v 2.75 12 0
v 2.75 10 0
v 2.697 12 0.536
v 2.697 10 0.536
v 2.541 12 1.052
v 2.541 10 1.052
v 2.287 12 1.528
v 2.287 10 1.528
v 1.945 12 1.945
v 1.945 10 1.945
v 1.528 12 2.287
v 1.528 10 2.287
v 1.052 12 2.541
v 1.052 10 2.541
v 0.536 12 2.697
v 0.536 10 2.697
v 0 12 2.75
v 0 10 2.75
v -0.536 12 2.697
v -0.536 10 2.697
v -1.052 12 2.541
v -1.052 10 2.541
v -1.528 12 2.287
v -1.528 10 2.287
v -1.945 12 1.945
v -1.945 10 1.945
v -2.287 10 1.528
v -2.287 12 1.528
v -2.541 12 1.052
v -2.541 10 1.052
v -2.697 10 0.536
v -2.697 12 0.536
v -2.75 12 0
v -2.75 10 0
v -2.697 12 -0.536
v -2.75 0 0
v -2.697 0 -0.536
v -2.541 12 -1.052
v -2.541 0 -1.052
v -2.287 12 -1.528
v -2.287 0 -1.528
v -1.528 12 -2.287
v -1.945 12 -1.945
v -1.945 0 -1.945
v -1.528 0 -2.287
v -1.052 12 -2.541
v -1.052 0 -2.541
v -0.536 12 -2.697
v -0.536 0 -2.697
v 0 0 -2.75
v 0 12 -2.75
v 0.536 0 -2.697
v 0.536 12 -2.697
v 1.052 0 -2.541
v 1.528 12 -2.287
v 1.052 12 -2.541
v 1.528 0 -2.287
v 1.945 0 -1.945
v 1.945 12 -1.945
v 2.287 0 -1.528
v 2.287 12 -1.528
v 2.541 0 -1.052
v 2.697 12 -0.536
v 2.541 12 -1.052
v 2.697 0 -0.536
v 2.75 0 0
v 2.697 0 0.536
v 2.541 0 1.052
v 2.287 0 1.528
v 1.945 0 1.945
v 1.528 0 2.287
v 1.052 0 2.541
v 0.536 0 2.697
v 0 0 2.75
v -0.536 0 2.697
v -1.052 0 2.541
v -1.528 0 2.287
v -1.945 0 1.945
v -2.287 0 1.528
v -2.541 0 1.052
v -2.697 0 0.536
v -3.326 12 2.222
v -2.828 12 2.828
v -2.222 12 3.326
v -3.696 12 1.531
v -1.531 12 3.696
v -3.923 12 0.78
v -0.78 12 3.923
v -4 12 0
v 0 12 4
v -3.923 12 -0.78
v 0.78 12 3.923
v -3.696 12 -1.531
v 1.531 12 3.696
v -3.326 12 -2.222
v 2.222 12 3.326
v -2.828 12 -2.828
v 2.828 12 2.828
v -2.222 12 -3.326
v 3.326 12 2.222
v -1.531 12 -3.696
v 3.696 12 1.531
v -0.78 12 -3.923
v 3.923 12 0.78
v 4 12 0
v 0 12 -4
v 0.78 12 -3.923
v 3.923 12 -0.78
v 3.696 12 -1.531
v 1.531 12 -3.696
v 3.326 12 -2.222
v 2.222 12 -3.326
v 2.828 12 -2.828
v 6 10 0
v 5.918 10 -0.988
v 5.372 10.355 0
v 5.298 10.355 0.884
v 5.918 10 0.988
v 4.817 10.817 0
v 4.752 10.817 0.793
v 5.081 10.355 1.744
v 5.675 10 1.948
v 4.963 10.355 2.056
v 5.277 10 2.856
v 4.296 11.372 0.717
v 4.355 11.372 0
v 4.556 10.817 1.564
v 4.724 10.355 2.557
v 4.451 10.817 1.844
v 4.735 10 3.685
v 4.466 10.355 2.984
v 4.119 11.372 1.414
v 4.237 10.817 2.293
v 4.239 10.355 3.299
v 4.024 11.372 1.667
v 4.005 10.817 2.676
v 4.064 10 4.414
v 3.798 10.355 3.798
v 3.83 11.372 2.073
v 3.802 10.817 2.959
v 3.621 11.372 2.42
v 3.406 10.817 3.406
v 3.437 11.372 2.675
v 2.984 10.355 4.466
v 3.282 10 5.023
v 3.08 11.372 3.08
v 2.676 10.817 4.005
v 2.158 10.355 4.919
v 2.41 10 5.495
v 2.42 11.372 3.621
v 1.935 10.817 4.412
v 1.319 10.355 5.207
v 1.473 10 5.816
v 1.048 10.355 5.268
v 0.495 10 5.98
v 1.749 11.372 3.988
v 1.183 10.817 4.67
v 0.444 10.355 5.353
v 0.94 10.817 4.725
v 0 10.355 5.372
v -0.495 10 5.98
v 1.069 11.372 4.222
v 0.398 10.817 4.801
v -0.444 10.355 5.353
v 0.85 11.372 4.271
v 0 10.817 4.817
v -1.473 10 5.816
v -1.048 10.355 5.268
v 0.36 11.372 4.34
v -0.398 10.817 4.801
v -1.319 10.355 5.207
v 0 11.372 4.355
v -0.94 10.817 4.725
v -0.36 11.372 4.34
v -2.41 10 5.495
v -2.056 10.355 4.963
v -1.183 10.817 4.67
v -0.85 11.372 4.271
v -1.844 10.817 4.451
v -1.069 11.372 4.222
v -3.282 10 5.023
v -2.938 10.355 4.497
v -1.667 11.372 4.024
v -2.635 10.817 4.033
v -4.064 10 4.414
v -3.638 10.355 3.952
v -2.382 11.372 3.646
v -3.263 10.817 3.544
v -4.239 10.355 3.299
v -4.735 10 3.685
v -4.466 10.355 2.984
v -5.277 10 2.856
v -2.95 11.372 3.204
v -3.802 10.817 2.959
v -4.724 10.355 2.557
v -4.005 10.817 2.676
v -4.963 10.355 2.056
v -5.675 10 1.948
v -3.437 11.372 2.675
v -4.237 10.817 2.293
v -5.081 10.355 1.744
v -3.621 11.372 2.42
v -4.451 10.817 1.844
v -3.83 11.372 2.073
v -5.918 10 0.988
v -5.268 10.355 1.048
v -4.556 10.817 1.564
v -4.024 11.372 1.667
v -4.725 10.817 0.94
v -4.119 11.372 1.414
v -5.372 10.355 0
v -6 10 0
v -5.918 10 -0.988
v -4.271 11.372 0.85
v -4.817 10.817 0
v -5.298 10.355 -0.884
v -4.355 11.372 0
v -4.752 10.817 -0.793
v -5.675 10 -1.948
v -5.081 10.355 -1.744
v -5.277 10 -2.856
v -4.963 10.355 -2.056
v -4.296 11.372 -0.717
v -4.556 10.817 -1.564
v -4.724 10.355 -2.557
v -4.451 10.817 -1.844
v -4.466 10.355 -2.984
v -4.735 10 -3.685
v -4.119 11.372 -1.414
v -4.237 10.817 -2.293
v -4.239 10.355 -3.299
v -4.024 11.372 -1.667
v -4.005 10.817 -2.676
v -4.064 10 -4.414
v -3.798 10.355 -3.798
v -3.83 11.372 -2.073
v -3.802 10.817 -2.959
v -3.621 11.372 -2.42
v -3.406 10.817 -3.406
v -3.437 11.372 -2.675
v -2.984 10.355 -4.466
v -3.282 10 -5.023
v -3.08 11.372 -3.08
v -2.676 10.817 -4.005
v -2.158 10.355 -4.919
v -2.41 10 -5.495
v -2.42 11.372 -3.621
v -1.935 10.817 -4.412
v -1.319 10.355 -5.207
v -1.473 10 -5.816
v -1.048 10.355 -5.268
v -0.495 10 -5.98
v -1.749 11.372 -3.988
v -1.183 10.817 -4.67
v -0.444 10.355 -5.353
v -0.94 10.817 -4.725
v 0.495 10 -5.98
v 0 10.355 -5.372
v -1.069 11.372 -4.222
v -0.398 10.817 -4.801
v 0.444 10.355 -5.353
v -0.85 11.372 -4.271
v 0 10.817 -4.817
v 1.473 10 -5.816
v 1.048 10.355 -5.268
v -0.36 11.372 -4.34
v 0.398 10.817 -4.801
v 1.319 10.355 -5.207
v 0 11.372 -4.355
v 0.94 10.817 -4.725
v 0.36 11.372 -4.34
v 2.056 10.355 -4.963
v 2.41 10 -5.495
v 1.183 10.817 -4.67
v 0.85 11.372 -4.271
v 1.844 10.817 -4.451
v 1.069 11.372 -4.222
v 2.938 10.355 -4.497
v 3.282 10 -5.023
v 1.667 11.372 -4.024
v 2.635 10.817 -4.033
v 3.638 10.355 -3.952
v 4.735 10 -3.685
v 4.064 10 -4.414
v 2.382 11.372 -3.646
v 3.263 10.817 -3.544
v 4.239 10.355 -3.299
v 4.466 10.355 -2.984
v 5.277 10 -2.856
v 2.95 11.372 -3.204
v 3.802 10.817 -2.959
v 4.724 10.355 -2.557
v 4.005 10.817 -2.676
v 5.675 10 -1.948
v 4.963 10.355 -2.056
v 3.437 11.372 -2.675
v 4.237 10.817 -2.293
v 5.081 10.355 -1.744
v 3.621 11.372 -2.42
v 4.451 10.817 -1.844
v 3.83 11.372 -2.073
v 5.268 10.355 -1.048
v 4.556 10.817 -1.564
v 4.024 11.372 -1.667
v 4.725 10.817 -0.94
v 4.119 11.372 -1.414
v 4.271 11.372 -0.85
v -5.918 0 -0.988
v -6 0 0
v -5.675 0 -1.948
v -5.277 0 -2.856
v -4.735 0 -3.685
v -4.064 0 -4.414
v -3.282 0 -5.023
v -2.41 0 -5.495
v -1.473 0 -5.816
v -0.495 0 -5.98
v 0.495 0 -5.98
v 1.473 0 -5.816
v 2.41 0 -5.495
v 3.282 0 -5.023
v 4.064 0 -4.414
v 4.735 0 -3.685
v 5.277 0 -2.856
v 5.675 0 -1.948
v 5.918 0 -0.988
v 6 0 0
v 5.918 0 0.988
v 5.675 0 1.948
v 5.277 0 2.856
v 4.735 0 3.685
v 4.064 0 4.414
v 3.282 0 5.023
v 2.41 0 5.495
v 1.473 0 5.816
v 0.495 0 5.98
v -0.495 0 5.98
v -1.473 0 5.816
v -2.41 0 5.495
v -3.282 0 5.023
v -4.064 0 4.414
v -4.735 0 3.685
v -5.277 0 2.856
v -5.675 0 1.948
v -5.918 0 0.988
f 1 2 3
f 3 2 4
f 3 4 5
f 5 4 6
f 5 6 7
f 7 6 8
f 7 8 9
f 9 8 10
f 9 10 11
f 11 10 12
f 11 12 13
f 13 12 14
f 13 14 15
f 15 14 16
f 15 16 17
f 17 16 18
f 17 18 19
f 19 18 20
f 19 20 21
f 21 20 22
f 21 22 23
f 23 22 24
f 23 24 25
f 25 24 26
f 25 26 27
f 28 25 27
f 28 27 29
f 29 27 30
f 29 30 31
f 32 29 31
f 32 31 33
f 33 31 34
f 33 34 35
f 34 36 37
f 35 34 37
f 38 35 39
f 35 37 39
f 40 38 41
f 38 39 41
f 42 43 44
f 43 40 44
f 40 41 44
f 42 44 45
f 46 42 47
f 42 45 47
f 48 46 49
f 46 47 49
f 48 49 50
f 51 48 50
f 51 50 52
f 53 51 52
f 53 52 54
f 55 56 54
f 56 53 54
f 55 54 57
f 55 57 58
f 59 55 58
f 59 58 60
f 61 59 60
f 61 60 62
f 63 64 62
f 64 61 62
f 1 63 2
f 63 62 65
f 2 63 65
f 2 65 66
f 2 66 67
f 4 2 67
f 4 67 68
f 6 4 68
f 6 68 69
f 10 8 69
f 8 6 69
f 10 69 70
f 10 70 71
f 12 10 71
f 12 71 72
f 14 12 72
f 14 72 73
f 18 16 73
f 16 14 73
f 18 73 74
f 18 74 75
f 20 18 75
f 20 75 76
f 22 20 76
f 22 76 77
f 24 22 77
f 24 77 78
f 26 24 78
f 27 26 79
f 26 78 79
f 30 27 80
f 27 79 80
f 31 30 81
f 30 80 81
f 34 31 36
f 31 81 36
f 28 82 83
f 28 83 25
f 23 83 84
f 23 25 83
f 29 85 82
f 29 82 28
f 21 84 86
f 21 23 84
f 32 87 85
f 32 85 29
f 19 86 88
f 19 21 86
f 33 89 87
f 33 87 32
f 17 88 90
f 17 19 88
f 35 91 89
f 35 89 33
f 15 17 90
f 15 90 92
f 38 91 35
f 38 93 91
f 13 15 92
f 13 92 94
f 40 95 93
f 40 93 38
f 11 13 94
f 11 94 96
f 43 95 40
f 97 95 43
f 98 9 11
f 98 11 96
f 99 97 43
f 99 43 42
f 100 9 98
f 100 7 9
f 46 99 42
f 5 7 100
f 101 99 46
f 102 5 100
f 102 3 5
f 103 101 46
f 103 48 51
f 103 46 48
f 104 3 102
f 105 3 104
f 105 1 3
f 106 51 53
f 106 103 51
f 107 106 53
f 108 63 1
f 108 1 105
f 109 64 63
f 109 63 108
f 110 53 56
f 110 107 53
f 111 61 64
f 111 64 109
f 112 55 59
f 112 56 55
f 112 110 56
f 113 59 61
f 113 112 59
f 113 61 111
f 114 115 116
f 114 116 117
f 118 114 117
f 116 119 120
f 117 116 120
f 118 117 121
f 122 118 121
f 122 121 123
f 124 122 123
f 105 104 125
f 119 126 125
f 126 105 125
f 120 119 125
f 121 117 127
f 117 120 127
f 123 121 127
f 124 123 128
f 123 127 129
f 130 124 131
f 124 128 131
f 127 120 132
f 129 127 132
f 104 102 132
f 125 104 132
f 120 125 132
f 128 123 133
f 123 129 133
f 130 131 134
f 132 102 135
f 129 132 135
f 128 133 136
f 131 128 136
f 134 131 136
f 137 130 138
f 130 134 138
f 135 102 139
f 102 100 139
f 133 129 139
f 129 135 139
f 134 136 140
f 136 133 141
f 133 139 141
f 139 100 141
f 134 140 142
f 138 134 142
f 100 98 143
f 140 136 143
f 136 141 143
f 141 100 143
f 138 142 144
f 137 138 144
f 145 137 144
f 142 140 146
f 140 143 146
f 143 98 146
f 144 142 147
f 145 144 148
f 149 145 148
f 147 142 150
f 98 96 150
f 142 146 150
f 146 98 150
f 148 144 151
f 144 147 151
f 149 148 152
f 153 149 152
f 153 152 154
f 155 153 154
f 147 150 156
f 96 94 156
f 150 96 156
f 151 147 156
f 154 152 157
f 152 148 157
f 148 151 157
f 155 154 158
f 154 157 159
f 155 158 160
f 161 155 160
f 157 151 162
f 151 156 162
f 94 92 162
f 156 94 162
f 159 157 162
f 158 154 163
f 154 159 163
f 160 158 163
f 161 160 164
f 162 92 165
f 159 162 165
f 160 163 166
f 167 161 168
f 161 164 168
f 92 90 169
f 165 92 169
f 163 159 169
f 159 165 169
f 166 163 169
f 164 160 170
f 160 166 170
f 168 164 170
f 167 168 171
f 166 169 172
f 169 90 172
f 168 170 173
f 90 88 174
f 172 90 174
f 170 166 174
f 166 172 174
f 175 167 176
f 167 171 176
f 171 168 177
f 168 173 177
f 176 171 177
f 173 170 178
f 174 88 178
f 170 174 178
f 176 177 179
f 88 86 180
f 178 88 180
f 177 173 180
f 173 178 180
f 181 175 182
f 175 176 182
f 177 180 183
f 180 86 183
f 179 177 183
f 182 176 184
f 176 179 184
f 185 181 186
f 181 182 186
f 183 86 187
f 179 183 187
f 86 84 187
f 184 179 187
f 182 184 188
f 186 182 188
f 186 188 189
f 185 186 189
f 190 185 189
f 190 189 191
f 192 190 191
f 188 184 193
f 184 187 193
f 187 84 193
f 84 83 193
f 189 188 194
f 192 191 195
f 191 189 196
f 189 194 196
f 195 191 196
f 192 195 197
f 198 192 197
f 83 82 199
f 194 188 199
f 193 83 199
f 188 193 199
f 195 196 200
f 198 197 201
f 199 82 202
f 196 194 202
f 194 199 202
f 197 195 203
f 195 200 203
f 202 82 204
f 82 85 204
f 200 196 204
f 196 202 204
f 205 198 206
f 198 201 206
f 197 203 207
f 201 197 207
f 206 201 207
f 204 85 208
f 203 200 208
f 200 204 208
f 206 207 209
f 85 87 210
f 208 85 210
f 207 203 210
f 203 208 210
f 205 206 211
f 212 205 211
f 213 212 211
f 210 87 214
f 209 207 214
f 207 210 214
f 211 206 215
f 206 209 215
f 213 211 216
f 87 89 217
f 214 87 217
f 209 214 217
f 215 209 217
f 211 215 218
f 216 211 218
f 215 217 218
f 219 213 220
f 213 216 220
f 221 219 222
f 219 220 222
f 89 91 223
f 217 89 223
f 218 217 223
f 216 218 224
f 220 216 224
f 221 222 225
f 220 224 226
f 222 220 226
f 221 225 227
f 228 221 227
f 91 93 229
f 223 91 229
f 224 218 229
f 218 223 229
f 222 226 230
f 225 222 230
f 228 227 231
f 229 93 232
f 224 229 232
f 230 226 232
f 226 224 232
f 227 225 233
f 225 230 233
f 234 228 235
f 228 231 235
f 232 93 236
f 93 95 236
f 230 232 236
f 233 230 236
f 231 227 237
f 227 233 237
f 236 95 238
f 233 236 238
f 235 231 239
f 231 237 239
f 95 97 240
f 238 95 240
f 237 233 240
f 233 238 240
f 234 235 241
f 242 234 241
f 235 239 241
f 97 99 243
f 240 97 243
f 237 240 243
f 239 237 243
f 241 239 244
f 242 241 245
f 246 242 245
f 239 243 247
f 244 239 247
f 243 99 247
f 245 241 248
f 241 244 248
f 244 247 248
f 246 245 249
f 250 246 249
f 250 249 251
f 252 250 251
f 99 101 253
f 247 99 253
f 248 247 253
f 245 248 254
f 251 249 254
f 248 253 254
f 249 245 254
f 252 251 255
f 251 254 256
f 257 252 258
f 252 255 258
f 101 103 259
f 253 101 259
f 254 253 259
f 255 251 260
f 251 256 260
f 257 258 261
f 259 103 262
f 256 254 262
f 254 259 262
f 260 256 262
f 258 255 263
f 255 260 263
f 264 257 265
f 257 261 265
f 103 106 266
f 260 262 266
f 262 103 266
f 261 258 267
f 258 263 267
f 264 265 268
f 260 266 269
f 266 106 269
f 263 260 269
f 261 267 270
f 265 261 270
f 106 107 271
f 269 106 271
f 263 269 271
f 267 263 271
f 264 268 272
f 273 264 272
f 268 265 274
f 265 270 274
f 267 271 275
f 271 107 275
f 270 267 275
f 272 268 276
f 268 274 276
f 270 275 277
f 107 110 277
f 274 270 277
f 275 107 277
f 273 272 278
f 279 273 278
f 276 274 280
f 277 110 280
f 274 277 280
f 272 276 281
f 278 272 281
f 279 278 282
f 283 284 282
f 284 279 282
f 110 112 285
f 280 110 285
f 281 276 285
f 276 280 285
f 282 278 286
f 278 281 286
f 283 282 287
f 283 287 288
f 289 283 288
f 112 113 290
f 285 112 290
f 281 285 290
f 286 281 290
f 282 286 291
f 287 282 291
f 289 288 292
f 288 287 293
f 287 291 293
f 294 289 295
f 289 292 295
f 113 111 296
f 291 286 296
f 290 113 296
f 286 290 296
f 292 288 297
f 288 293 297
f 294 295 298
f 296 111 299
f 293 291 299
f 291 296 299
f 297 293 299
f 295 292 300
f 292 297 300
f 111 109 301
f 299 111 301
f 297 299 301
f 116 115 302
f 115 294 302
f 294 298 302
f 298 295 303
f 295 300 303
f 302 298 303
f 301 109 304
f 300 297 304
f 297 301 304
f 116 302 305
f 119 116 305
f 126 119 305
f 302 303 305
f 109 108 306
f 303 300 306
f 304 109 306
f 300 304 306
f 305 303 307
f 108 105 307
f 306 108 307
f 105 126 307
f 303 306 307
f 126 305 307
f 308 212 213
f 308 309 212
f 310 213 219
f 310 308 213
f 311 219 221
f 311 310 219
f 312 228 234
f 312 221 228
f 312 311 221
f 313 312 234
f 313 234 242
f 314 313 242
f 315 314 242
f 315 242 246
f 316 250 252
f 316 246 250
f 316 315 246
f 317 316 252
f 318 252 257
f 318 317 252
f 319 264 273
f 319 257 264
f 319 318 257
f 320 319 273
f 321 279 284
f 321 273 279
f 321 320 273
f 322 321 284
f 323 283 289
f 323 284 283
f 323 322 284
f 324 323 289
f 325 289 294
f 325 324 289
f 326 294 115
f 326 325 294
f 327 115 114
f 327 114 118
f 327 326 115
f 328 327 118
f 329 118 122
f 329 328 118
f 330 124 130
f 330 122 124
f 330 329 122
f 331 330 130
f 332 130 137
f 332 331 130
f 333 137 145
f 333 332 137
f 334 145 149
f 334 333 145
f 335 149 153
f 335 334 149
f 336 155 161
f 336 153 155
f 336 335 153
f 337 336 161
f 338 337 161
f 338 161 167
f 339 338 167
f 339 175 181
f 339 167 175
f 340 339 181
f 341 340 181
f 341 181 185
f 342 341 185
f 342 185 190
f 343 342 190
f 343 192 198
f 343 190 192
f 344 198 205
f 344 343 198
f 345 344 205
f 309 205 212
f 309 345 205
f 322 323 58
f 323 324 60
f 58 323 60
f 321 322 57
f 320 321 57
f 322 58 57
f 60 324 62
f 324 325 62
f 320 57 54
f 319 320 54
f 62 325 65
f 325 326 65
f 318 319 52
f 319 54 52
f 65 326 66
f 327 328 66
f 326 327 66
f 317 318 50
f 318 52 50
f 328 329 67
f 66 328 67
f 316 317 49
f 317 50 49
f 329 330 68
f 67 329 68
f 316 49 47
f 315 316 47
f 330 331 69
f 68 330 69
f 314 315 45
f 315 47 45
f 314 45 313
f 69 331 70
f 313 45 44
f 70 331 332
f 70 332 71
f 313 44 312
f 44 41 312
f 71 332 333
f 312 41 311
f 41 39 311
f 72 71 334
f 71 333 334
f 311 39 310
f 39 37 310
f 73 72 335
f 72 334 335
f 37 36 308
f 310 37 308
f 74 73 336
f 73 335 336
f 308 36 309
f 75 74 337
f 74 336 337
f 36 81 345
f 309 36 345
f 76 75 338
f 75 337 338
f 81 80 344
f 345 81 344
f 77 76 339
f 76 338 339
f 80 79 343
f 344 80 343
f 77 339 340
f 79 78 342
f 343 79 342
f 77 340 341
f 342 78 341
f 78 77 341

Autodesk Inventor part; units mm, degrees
ref_plane "YZ Plane" through (0, 0, 0) normal (1, 0, 0) x (0, 1, 0)
ref_plane "XZ Plane" through (0, 0, 0) normal (0, 1, 0) x (-1, 0, 0)
ref_plane "XY Plane" through (0, 0, 0) normal (0, 0, 1) x (1, 0, 0)
sketch "Sketch1" plane through (0, 0, 0) normal (0, 1, 0) x (-1, 0, 0)
  circle A0 centre (0, 0) radius 6
  circle A1 centre (0, 0) radius 2.75
  dimension "d0" = 12
  dimension "d1" = 5.5
extrude "Extrusion1" add sketch "Sketch1" along normal blind 10
sketch "Sketch2" plane through (0, 10, 0) normal (0, 1, 0) x (1, 0, 0)
  circle A0 centre (0, 0) radius 2.75
  circle A1 centre (0, 0) radius 4
  dimension "d4" = 5.5
  dimension "d5" = 8
extrude "Extrusion2" add sketch "Sketch2" along normal blind 2
fillet "Fillet1" radius 4 1 edges at (-4, 10, 0)
properties part number "Idler_Spacer"
